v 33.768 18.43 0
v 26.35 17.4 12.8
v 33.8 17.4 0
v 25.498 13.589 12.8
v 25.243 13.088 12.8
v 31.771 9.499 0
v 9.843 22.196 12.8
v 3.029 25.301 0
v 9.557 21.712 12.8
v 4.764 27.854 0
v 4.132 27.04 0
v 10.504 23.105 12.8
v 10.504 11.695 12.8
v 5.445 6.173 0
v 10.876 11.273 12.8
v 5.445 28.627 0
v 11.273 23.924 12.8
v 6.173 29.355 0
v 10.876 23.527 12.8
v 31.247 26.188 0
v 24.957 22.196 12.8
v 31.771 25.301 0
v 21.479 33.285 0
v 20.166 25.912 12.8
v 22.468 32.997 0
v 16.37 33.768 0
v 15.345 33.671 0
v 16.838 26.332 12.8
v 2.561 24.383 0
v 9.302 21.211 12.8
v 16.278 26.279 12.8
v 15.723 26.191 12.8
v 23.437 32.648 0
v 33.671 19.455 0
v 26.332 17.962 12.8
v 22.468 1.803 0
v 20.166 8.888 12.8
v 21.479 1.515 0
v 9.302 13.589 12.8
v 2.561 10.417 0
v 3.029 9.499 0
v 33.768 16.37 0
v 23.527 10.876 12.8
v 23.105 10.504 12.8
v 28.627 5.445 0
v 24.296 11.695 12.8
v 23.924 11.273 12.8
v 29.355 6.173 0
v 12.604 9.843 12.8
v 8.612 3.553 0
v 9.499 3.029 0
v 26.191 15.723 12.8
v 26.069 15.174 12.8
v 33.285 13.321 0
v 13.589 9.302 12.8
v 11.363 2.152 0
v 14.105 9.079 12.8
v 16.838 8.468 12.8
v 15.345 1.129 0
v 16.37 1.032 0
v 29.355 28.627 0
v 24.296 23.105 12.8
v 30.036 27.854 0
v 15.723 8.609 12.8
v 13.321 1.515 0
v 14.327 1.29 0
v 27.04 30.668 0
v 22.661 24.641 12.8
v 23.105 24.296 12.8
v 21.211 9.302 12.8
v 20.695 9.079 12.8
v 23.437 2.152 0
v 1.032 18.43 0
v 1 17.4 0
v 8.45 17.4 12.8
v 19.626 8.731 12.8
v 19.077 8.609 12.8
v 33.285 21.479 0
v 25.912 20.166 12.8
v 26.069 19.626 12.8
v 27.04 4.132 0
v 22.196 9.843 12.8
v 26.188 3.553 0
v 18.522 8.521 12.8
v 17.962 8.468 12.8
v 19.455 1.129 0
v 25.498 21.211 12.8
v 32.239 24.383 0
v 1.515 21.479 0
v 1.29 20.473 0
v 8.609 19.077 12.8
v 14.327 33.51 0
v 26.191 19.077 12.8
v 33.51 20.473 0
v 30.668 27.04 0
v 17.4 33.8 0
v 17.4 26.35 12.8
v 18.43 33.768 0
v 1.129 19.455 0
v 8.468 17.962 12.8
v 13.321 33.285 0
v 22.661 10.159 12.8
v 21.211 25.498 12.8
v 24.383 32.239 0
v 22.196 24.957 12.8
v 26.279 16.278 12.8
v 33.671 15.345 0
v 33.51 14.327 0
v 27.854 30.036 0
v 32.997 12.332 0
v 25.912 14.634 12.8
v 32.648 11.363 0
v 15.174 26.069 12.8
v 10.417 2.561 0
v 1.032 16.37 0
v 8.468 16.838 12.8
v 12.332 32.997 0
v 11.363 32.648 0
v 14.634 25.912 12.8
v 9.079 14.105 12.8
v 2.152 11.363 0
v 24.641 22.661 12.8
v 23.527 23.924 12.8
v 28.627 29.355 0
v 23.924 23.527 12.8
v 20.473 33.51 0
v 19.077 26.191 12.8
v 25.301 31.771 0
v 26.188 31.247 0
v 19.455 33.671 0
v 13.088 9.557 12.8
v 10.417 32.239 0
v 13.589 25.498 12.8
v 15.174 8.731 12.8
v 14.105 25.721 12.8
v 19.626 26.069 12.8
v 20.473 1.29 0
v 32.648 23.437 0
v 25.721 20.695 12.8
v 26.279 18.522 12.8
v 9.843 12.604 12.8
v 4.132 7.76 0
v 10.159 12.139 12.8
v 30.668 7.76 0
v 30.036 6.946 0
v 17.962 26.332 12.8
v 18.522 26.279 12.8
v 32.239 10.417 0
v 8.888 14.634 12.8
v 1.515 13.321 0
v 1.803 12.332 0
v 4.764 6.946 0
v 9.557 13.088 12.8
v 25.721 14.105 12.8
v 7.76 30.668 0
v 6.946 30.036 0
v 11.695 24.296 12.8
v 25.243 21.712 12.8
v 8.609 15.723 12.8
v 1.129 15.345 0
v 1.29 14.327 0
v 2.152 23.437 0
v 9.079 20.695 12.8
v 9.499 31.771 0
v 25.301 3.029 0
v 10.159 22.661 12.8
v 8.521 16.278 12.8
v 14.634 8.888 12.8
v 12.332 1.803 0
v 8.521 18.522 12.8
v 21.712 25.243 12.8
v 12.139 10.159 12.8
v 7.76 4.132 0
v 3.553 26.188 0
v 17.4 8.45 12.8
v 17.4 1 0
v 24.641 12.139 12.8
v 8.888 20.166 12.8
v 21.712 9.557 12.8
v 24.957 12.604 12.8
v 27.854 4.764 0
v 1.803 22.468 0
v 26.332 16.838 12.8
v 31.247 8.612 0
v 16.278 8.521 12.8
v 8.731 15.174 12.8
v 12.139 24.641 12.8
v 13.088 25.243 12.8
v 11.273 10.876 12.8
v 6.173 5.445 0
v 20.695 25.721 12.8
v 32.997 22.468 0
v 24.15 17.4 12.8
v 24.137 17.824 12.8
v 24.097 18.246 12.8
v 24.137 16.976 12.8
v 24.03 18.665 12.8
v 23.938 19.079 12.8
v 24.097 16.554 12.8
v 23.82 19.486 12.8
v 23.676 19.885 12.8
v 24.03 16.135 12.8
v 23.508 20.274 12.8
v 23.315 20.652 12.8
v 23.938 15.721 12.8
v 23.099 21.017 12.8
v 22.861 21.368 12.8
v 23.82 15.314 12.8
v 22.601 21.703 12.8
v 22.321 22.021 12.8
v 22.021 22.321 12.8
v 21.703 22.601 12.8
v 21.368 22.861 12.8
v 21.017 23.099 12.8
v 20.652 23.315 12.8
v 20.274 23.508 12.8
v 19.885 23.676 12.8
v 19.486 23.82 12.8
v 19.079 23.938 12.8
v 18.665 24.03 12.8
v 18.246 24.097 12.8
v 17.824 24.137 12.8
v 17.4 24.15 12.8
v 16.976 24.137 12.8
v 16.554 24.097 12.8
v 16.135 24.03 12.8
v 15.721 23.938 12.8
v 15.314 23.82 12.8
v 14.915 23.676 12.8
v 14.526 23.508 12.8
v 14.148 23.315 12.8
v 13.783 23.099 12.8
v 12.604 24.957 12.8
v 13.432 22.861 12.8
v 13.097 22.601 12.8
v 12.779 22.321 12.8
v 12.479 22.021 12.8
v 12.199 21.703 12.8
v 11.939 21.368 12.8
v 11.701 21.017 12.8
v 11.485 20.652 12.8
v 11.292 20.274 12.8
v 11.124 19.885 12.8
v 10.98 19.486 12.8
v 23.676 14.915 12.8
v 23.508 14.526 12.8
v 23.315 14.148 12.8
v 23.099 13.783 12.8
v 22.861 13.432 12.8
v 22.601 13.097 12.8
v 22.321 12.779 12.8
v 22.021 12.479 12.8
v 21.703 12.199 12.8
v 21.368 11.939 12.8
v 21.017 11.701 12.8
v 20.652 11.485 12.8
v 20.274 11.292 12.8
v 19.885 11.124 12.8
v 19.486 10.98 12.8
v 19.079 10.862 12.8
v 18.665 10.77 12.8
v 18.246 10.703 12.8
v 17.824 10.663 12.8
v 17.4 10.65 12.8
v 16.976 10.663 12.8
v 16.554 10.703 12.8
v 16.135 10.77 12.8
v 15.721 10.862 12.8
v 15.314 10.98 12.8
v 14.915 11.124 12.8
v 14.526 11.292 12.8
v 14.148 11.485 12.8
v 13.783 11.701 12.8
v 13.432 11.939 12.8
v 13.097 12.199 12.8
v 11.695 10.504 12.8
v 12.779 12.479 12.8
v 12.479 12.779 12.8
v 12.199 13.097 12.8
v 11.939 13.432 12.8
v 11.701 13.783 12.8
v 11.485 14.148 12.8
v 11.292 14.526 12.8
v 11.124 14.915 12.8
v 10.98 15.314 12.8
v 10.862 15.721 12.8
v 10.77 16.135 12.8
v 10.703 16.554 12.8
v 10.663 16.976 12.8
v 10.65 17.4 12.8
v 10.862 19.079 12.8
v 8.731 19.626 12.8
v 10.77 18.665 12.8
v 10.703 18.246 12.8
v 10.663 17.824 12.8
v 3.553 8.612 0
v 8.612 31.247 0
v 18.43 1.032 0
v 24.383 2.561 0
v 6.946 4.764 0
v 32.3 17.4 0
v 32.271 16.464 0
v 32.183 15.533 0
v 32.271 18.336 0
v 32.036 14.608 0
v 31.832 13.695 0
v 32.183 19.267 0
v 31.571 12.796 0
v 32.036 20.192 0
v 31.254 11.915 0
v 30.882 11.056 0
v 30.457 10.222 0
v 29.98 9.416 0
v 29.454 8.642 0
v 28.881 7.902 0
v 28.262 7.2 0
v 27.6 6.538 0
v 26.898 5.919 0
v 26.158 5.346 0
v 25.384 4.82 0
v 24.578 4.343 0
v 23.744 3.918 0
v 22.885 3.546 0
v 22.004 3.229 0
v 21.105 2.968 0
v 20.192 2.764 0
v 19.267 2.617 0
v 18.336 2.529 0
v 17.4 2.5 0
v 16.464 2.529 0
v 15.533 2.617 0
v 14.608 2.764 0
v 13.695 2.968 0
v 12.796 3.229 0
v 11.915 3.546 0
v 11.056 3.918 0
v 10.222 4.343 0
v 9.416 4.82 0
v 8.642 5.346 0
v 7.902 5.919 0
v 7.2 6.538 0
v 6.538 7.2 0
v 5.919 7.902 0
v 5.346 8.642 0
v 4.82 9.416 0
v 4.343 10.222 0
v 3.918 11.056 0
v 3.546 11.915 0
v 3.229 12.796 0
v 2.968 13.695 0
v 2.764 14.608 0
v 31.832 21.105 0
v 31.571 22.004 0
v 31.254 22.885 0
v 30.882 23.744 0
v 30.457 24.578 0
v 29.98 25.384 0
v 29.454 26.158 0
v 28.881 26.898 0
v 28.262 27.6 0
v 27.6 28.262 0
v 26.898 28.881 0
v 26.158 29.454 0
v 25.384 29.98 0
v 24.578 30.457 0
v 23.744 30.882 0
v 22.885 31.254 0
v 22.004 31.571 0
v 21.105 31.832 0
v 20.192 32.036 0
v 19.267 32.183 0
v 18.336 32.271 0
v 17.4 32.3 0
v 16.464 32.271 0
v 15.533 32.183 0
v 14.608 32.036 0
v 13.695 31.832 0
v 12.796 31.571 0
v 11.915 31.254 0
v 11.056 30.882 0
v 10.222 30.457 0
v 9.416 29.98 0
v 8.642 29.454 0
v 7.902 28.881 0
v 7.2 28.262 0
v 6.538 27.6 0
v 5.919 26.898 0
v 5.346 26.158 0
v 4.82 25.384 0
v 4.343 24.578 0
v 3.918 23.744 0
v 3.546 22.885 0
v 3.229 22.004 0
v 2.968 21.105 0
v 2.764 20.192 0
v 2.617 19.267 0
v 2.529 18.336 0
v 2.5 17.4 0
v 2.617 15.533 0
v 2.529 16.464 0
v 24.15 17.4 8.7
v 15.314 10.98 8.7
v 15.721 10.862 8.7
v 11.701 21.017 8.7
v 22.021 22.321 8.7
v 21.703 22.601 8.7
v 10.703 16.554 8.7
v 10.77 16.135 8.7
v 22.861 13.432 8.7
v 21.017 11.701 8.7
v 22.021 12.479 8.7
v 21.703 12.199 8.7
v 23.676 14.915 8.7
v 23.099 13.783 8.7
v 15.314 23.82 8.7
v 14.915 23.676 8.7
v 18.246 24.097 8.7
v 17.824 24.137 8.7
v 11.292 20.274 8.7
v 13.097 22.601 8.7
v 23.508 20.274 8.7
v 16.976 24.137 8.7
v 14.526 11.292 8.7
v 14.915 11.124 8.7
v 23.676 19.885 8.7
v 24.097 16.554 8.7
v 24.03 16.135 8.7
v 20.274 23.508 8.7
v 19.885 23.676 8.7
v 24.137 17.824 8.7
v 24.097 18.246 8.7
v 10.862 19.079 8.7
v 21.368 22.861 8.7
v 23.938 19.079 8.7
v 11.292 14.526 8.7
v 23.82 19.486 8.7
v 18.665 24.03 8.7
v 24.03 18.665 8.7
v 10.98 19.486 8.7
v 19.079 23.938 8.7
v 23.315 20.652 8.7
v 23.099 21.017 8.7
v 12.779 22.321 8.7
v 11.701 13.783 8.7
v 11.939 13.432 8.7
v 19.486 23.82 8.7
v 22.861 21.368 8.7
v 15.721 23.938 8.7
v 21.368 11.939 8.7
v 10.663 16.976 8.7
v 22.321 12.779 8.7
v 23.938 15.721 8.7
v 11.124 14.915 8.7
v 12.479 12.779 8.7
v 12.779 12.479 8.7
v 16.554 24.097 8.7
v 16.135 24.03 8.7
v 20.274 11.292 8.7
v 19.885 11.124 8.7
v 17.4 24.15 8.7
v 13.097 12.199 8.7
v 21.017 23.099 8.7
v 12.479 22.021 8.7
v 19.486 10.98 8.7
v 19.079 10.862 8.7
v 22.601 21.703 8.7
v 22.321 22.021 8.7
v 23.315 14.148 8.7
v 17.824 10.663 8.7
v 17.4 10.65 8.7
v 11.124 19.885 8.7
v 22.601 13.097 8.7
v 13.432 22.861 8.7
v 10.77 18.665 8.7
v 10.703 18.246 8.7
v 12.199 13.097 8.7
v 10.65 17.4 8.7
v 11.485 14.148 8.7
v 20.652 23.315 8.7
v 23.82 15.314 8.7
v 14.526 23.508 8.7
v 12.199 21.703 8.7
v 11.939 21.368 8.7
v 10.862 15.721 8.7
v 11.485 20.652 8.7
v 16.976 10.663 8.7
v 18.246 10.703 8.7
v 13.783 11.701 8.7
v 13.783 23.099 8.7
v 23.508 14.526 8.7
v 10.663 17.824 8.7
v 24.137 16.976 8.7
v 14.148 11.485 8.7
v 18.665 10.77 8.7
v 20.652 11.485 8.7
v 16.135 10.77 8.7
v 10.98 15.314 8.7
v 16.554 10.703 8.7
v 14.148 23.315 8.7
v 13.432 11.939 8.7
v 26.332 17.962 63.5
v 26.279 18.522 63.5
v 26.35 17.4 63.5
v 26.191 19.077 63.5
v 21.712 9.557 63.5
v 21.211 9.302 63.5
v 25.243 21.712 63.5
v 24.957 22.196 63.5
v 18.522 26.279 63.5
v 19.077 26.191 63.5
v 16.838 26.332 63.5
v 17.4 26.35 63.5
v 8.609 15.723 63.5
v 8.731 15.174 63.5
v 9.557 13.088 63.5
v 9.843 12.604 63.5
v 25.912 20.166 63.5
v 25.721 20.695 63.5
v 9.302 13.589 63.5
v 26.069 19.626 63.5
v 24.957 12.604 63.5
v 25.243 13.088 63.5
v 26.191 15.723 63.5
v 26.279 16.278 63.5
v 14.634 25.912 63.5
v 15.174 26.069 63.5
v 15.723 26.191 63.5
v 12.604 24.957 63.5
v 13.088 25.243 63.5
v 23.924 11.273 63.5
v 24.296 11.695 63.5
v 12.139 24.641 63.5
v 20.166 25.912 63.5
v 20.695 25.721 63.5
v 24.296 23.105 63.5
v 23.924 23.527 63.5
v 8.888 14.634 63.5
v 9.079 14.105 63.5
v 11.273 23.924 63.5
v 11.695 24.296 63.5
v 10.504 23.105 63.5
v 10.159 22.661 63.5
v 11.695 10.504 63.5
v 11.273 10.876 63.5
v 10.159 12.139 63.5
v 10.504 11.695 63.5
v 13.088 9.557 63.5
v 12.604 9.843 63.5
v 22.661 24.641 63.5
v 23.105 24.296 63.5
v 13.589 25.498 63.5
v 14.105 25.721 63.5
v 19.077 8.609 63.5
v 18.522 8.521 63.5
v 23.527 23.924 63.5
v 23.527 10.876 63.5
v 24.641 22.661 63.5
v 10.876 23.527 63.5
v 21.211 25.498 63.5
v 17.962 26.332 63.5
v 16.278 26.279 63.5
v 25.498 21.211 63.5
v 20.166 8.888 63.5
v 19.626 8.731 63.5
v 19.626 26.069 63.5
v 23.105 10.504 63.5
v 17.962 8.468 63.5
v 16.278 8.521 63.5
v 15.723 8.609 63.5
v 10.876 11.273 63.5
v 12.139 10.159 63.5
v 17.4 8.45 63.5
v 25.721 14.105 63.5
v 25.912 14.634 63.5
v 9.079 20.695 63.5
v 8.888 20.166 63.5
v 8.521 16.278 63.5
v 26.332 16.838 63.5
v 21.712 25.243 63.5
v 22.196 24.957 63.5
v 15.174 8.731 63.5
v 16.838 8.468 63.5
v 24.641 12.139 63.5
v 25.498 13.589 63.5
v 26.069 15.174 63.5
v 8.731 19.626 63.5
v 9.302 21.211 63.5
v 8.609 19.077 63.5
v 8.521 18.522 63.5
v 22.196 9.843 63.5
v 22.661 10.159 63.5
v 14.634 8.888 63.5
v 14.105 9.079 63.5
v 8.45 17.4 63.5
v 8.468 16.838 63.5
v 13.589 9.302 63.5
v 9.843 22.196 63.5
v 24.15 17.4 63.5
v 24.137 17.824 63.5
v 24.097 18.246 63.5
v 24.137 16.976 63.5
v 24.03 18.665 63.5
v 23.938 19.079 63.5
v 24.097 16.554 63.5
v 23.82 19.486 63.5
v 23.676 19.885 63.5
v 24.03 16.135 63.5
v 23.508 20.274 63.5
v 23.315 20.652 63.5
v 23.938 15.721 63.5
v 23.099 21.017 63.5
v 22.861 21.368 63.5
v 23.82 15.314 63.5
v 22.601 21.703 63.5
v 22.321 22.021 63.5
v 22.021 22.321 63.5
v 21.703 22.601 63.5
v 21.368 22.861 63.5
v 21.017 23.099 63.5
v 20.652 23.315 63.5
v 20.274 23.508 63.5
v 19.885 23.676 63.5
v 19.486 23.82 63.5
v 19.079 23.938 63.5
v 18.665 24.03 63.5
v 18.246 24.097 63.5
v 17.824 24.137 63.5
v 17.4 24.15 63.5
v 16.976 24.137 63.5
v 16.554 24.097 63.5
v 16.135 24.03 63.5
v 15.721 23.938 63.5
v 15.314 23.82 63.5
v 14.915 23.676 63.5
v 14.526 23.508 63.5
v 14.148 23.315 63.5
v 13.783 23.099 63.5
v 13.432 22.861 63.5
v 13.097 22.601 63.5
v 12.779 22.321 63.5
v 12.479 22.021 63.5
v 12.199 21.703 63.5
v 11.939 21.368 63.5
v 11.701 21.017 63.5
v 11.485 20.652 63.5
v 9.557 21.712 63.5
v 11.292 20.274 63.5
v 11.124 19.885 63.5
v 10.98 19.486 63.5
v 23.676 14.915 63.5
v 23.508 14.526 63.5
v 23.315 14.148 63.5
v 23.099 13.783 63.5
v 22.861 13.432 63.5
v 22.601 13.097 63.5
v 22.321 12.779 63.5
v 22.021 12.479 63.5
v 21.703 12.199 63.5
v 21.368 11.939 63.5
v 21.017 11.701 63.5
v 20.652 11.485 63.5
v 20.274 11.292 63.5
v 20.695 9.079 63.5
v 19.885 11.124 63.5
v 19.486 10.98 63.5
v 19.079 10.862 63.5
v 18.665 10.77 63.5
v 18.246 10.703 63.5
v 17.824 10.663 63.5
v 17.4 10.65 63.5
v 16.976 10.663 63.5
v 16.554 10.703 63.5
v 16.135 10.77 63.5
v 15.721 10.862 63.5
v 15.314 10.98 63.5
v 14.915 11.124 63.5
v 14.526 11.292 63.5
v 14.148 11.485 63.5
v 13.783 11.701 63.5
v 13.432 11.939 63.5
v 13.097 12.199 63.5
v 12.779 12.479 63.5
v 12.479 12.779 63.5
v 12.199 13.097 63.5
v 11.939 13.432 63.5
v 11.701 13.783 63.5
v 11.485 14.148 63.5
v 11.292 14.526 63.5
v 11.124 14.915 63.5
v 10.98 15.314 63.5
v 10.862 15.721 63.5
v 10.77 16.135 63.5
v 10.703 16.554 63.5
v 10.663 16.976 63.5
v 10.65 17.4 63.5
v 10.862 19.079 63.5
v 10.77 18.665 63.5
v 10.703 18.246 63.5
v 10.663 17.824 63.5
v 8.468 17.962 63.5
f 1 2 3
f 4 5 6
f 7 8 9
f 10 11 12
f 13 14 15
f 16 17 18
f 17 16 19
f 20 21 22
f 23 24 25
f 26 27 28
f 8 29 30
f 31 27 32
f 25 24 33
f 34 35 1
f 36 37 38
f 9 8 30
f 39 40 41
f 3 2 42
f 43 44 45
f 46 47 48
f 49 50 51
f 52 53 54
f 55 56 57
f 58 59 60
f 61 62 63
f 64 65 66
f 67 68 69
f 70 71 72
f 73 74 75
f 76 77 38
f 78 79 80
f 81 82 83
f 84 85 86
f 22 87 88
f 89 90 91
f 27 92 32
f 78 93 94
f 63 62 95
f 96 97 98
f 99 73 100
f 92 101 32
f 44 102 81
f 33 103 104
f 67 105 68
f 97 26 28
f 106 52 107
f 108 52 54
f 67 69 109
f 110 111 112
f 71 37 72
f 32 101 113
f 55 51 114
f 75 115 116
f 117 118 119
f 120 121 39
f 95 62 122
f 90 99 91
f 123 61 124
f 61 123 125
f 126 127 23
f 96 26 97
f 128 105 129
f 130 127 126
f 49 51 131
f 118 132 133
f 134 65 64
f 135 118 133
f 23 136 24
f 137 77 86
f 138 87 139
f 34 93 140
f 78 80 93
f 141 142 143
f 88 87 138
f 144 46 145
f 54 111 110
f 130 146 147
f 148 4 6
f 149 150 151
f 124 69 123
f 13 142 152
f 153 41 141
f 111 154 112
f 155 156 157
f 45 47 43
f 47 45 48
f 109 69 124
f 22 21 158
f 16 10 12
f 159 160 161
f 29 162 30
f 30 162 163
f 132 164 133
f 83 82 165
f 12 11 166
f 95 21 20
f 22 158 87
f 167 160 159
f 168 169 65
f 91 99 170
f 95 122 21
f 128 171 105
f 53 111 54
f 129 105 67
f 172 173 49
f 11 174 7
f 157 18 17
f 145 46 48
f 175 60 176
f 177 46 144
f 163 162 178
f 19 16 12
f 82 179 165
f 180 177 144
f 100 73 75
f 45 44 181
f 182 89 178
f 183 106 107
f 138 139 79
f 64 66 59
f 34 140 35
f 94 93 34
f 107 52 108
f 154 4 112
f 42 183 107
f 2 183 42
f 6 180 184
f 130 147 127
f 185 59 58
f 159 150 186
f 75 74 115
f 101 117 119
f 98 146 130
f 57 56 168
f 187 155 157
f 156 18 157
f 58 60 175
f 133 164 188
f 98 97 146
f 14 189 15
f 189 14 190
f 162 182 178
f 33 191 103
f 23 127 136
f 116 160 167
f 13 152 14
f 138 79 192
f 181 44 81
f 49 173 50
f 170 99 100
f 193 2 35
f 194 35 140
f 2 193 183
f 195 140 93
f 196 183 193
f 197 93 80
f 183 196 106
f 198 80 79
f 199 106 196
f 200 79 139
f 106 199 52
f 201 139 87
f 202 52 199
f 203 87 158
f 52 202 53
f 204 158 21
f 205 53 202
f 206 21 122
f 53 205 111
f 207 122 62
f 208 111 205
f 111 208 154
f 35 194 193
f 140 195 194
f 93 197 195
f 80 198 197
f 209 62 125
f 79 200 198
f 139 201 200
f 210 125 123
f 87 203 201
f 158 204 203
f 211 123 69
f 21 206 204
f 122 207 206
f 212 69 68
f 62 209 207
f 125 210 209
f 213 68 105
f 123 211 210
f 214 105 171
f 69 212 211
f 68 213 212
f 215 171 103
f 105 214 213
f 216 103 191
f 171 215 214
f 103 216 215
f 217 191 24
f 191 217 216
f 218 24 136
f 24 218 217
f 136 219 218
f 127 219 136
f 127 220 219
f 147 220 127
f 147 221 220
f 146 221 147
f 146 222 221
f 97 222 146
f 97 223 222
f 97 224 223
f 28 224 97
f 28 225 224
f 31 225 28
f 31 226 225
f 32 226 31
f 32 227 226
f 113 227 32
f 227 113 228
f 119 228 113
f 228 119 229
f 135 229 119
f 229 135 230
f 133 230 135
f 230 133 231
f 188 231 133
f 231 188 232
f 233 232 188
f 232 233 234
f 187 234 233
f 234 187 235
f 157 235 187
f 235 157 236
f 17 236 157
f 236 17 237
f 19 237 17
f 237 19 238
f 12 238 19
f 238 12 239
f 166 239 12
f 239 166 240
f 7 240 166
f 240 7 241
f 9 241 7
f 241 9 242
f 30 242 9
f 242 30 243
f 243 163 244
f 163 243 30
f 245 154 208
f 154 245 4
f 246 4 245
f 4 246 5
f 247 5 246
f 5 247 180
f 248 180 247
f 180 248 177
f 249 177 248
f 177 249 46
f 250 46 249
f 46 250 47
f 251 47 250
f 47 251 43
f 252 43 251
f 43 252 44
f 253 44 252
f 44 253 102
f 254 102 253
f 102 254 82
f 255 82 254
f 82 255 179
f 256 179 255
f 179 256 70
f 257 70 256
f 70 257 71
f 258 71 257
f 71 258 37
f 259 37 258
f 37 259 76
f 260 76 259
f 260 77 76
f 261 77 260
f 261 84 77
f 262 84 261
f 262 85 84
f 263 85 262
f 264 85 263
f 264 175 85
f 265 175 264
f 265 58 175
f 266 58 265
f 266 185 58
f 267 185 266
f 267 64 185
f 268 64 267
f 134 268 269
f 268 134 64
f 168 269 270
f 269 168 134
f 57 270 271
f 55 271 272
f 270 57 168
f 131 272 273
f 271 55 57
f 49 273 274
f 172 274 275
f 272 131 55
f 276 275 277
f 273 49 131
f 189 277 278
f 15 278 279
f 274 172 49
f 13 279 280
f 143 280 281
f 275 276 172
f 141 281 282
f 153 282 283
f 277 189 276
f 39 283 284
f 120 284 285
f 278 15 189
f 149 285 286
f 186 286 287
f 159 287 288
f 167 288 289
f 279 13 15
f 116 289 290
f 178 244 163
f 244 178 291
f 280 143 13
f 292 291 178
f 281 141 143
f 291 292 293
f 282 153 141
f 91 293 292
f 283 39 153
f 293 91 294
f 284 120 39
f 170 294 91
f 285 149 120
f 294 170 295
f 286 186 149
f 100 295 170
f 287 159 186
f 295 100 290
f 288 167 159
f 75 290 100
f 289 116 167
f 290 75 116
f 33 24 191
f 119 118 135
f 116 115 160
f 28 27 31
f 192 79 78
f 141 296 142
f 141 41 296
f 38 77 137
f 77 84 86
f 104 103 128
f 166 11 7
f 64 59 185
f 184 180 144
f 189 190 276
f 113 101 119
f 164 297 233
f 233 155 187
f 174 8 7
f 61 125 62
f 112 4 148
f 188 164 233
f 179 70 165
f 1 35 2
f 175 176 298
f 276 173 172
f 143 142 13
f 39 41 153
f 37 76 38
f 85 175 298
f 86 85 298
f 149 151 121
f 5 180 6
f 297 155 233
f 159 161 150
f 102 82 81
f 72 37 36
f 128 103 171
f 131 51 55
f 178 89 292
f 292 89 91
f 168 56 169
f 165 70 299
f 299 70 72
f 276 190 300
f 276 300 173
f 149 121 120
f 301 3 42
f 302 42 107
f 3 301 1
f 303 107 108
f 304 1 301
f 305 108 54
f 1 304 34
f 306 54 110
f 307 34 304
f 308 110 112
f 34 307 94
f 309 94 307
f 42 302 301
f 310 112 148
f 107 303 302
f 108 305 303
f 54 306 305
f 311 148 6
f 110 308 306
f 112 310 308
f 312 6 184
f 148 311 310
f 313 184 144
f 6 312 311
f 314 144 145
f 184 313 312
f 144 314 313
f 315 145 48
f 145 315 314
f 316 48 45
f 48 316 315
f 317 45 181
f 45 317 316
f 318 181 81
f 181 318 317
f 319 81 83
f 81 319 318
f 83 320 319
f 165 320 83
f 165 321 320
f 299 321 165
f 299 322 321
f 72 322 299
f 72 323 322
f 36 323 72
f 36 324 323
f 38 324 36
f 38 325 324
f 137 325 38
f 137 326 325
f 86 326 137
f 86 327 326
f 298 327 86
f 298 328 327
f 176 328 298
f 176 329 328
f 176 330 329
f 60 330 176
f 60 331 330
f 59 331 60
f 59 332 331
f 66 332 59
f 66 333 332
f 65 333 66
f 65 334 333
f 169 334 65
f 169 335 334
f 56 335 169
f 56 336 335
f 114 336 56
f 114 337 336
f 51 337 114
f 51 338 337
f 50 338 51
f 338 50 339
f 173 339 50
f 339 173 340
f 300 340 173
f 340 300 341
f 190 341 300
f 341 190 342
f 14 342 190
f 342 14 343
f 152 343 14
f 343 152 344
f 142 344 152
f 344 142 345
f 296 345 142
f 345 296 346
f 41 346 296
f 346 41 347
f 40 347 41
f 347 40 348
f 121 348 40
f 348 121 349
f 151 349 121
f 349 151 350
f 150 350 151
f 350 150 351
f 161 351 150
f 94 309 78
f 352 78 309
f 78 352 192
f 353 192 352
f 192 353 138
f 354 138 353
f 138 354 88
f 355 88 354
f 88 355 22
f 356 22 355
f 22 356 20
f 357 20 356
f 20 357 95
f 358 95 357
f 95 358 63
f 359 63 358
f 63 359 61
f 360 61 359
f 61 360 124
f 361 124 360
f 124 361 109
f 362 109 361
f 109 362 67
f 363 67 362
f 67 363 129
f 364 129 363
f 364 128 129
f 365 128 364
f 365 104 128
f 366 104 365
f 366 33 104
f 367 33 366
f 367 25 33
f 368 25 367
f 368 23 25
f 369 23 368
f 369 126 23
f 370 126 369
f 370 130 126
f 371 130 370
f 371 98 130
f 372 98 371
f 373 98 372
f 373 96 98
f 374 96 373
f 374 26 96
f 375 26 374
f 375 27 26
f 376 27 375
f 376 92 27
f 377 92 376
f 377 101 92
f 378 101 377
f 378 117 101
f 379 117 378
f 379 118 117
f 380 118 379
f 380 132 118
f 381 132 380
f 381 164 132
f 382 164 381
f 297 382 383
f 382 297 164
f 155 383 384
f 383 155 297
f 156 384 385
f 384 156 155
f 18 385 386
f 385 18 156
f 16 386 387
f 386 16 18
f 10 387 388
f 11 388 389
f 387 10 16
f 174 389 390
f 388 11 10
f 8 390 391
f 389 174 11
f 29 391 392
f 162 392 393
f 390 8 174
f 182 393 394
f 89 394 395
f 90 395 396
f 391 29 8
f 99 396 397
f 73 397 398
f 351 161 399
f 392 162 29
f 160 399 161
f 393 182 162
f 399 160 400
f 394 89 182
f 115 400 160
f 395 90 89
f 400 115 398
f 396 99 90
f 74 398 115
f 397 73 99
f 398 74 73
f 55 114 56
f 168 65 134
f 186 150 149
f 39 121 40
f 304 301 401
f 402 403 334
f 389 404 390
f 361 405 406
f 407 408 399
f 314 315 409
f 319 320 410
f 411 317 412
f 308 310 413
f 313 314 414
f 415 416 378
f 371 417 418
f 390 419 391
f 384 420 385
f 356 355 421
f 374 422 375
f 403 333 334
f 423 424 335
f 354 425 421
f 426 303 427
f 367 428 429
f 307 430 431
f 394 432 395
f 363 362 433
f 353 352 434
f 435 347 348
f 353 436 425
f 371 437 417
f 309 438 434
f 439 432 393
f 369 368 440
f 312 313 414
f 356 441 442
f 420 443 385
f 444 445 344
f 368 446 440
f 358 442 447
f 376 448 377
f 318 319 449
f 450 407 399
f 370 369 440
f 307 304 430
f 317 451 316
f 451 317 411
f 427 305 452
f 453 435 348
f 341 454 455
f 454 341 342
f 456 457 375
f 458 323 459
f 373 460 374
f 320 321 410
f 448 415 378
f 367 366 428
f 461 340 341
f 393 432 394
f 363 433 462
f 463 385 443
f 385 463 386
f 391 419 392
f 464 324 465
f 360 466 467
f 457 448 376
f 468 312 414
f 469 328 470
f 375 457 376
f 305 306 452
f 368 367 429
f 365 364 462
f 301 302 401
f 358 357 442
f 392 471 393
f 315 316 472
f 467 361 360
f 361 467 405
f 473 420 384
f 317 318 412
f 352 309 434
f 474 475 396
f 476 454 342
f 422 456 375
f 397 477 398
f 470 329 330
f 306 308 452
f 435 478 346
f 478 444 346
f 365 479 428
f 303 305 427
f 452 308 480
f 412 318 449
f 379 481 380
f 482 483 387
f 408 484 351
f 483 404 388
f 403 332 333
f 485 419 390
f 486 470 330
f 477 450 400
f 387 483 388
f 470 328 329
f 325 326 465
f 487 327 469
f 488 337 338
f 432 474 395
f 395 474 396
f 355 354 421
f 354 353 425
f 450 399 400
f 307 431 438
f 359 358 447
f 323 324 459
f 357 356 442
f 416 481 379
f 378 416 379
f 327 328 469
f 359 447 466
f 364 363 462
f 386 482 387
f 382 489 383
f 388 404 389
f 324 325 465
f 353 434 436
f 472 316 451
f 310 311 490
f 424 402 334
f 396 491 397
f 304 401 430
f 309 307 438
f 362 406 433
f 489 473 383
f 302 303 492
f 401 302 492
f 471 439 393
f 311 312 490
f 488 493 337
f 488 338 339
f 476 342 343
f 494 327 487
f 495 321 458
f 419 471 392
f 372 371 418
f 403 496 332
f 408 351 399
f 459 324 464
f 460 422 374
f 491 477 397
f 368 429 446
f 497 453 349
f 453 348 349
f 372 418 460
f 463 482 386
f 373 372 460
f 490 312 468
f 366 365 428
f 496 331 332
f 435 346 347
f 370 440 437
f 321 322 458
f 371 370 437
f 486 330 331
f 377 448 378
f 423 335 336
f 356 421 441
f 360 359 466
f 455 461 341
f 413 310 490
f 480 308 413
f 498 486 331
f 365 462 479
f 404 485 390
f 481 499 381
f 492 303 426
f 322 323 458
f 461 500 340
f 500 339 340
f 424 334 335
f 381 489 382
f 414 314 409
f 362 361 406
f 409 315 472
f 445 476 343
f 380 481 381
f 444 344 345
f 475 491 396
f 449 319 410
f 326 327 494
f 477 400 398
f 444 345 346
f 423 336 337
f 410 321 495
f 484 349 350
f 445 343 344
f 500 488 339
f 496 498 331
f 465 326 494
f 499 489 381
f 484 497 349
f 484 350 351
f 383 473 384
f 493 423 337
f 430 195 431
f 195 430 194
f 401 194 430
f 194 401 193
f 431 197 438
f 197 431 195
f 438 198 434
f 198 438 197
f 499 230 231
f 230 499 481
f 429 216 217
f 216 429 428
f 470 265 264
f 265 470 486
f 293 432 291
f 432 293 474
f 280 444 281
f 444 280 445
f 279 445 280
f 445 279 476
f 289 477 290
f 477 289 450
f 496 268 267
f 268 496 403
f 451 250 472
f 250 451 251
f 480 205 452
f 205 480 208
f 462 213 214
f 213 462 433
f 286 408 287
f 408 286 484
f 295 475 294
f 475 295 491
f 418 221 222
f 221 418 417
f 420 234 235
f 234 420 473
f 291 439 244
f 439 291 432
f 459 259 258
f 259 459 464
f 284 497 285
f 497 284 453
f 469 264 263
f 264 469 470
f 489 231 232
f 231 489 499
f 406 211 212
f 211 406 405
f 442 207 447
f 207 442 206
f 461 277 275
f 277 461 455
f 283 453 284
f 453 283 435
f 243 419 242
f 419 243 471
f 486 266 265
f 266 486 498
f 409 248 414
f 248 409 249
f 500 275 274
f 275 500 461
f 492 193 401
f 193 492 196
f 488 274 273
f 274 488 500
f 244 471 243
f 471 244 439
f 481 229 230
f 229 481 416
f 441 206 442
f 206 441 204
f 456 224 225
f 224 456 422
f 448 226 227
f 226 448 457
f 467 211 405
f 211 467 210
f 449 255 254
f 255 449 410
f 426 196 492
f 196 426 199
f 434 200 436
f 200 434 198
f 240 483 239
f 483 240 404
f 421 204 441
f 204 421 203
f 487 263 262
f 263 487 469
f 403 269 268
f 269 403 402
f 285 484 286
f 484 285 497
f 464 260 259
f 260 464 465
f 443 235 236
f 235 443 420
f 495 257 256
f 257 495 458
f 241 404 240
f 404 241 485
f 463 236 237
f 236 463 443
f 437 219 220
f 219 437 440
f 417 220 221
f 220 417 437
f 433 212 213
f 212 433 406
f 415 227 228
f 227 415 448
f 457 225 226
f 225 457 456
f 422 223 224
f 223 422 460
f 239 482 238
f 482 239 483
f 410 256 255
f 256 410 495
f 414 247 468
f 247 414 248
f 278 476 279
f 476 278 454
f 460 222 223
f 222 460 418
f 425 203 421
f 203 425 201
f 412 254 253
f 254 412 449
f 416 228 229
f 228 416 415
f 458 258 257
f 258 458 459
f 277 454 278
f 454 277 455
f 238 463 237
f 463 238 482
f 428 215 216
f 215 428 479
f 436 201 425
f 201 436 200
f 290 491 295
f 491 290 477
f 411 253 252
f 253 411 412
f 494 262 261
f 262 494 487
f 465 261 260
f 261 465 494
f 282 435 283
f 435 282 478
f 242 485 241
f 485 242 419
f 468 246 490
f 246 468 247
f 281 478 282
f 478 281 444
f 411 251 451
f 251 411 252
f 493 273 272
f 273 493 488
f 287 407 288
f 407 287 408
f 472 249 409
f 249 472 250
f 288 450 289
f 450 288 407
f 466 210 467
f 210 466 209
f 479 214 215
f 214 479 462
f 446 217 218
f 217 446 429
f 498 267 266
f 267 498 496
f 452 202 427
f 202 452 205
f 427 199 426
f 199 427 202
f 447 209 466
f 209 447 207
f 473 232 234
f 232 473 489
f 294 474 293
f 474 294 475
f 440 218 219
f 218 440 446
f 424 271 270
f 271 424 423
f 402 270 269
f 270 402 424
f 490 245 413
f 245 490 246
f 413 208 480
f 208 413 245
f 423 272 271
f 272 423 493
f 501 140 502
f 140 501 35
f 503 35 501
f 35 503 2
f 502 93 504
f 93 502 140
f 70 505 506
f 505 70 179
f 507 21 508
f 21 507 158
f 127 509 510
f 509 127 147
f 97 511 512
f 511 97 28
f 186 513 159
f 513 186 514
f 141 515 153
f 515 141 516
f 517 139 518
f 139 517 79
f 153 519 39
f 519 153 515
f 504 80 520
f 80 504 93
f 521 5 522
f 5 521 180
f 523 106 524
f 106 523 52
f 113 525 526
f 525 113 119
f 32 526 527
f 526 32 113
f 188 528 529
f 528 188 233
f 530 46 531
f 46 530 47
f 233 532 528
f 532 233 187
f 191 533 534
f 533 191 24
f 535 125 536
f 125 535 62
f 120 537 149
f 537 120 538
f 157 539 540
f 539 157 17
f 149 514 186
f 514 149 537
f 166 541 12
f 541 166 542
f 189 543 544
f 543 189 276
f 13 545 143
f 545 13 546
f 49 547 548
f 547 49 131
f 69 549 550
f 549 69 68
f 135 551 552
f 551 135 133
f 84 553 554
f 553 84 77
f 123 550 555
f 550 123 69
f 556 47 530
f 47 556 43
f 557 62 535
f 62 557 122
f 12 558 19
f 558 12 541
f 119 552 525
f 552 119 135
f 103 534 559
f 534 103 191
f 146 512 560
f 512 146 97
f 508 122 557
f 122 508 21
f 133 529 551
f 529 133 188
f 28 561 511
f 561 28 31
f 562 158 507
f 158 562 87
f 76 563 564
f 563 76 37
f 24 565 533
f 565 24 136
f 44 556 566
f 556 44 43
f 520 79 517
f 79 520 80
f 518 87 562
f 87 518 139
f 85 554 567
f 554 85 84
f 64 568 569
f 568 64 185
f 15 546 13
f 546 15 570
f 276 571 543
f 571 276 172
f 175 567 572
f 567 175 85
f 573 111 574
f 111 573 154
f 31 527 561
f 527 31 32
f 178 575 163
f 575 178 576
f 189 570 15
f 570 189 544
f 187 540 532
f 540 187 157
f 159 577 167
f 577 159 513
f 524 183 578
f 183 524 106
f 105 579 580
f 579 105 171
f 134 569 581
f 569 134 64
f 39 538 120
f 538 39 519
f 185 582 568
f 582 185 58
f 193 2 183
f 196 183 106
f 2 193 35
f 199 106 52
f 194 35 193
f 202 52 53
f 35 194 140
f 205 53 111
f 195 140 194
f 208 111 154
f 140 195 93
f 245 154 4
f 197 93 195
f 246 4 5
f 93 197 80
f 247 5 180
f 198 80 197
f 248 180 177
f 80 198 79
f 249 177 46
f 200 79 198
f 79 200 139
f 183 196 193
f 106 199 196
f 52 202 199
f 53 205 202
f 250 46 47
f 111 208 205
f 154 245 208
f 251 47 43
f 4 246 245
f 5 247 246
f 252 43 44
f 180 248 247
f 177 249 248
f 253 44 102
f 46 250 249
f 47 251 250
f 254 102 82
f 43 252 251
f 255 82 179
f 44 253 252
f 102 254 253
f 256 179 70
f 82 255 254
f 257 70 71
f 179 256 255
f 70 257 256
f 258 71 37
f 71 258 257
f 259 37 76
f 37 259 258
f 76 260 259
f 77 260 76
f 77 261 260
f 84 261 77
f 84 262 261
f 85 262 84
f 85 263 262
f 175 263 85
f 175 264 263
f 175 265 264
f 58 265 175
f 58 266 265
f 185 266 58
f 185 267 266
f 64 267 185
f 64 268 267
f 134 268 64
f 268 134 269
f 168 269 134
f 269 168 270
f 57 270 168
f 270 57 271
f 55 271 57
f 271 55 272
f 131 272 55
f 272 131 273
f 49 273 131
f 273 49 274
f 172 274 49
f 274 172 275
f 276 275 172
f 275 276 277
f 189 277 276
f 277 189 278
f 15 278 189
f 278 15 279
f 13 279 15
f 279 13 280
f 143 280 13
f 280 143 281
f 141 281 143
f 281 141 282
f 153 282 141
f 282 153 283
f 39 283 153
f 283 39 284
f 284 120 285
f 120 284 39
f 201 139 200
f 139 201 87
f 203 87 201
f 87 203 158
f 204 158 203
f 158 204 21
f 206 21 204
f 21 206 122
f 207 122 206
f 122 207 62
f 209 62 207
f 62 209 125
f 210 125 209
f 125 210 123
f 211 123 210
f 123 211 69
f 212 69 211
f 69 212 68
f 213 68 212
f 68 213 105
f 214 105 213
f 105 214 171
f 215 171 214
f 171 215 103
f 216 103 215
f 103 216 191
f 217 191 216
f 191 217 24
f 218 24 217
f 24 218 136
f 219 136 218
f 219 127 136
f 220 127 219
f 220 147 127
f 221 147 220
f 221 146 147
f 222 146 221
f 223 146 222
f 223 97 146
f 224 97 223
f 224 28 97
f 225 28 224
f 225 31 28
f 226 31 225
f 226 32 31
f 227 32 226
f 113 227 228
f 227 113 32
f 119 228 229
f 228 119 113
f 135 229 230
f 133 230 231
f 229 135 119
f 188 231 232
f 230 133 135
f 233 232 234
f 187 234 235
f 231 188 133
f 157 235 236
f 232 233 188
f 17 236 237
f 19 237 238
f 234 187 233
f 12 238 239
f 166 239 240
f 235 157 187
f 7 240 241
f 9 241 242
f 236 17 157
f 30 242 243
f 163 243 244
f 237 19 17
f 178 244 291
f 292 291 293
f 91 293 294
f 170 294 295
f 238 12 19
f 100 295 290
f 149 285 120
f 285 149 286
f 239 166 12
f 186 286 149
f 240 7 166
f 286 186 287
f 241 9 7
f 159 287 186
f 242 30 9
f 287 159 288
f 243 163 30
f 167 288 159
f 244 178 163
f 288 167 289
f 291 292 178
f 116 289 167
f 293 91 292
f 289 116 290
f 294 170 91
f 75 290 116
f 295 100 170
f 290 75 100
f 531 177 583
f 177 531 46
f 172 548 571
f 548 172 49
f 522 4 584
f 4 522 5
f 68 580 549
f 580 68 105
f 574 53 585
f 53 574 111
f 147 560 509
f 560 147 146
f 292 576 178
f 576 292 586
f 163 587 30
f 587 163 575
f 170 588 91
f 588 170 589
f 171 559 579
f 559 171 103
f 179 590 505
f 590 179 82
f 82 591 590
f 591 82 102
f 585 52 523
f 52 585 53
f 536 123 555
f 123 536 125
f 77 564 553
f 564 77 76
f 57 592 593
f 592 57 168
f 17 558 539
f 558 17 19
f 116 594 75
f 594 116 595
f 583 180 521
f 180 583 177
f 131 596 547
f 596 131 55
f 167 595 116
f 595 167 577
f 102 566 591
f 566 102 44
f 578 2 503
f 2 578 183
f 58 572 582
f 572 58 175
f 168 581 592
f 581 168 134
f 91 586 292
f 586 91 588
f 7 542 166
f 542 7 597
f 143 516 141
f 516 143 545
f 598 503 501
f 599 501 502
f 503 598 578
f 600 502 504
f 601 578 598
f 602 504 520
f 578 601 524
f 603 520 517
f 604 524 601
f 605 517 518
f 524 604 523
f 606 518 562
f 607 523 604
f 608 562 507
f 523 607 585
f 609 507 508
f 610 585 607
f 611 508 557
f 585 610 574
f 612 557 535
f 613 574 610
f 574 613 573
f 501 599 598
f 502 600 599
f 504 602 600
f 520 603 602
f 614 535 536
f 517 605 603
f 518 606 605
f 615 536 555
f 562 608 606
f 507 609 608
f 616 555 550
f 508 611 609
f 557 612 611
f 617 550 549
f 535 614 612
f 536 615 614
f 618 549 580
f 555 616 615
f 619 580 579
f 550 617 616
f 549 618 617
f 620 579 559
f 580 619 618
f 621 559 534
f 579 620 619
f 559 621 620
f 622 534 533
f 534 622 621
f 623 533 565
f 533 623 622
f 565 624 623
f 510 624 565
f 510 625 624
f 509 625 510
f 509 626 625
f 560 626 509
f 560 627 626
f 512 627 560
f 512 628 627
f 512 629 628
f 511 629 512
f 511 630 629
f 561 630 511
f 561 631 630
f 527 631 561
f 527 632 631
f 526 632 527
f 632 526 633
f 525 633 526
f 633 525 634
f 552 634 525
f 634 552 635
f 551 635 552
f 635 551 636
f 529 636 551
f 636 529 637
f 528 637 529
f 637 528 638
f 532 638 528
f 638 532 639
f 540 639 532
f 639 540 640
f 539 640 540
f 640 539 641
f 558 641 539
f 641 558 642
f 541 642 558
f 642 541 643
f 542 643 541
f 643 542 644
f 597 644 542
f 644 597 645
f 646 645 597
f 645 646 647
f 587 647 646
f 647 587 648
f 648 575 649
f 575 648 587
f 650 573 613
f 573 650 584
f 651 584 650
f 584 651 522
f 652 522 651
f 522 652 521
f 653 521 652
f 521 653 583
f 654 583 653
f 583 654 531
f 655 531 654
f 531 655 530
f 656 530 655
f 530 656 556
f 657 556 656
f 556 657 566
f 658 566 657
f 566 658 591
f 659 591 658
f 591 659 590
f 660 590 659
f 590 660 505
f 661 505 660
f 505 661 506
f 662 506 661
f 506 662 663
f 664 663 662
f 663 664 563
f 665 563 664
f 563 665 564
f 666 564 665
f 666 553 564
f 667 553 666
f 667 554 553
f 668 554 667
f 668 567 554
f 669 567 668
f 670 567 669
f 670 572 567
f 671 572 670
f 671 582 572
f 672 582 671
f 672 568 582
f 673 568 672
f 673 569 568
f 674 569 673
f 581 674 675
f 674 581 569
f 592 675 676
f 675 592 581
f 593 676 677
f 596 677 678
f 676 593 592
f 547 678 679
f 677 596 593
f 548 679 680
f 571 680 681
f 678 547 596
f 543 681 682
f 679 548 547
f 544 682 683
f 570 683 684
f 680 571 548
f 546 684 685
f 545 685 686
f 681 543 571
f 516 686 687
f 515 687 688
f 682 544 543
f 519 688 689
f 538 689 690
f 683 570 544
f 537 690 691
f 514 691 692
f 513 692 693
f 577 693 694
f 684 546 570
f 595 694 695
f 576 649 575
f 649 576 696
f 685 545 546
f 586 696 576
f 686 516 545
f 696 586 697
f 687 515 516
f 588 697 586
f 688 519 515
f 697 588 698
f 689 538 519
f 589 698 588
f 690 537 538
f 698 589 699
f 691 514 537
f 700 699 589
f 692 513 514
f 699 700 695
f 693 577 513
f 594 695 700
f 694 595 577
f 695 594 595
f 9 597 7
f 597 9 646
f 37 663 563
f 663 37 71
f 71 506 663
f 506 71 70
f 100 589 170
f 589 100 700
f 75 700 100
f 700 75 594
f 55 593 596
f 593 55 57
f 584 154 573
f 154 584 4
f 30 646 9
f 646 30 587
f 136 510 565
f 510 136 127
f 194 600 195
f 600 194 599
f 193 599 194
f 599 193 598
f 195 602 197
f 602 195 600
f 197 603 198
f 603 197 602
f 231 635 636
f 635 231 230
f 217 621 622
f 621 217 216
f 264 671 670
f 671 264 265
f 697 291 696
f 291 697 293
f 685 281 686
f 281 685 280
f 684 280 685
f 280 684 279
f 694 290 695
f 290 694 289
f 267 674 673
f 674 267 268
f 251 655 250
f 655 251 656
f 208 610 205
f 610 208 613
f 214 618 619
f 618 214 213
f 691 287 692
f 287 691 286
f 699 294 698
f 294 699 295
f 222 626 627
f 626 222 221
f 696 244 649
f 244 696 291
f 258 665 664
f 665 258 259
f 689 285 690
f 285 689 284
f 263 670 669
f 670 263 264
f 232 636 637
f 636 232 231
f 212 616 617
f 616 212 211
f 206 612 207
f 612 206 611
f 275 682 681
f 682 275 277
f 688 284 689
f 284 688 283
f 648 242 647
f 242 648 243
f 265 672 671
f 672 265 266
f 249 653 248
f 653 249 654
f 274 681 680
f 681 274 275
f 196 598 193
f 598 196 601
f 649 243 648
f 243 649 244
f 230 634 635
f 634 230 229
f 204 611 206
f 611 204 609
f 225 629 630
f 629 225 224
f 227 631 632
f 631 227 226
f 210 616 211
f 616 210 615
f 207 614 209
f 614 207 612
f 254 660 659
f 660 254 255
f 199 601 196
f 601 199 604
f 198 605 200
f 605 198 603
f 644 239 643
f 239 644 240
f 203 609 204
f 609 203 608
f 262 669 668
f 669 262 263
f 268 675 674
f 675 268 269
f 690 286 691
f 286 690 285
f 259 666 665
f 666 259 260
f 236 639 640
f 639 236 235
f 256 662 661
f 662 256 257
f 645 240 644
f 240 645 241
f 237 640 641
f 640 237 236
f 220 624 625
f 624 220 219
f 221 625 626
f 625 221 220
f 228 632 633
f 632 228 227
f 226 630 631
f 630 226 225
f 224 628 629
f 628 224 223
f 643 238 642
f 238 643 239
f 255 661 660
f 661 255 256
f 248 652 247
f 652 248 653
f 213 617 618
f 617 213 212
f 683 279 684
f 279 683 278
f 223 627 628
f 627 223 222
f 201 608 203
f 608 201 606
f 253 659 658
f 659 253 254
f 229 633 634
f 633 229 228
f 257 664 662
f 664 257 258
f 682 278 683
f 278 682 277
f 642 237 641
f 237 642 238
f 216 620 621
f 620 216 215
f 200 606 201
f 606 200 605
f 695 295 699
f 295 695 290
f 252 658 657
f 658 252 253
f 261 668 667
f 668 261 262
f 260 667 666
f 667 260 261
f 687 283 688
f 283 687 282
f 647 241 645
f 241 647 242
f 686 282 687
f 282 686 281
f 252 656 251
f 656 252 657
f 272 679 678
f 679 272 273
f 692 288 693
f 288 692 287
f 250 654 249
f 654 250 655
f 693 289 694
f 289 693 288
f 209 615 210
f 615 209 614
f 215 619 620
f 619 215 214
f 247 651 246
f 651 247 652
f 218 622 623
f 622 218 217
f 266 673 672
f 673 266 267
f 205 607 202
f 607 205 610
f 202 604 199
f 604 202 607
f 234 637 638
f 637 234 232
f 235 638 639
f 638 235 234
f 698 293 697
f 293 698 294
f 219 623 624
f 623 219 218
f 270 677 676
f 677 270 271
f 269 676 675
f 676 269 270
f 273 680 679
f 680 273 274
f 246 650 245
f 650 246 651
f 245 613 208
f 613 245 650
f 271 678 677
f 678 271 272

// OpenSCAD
// v1.2 changed inside radius of funnel to 14.9 for a broader print base
// v1.3 added thread to ring 1, removed top notch from wire groove

module outer_ring_tap_29mmDiamRightHanded() {
	import("C:\\Users\\Intel\\Documents\\OpenSCAD\\FunnelTip\\OuterRingTap_29mmDiamRightHanded.stl");	
}

module funnel_tip() {
	union() {

		// Part 1, funnel

		// diameter 32.8 (radius , place (x.y) such that there is 1mm margin
		translate([17.4, 17.4, 0])
		union() {
			difference() { 	
				cylinder(h = 12.8, r1 = 16.4, r2 = 8.95, $fn = 100);		
				cylinder(h = 8.7, r1 = 14.9, r2 = 6.75, $fn = 100); // r1 = 15.4
				translate([0, 0, 8.7])
				cylinder(h = 7.5, r = 6.75, $fn = 100);
			}
			translate([0, 0, 12.8])
			difference() { 
				cylinder(h = 50.7, r = 8.95, $fn = 100);		
				cylinder(h = 50.7, r = 6.75, $fn = 100);
			}
		}


		// Part 2, funnel tip


		/* Notes on placing grooves 
		Base shape (cube + cylinder) is dislocated based on largest radius minus width of cube.
		*/

		// max radius 41.8, place (x.y) such that there is 1mm margin
		// between all elements
/*
		difference() {
			translate([55.7, 21.9, 0])
			union() {
			//base
				difference() {
					cylinder(h = 11.6, r1 = 16.3, r2 = 20.9, $fn = 100); // r1 = 32.6, r2 = 41.8
					cylinder(h = 11.6, r1 = 15.3, r2 = 9, $fn = 100); // r1 = 30.6, r2 = 18
				}
				translate([0, 0, 11.6])
				difference() {
					cylinder(h = 15, r = 20.9, $fn = 100);
					cylinder(h = 15, r = 9, $fn = 100);
				}
				translate([0, 0, 26.6])
				difference() {
					cylinder(h = 10, r = 12.875, $fn = 100);
					cylinder(h = 10, r = 9, $fn = 100);
				}
			}

			translate([55.7, 21.9, 19.6])
			difference() {
				cylinder(h=3.5, r = 20.9, $fn = 100);
				cylinder(h=3.5, r1 = 18.5, r2 = 20.9, $fn = 100);
			}

			// 1st groove, S
			translate([55.7, 2.15,0])
			union() {
				translate([0, 0, 20.8])	  
				rotate ([90,0,0]) cylinder 
				(h = 2.3, r=2.25, center = true, $fn = 100);
				translate([0, 0, 10.4])	  
				cube([4.5, 2.3, 20.8], center = true, $fn = 100);
			}

			// 2nd groove, N
			// translate([55.7, 2.15,0]) // 2.15 + 39.5 = 41.65
			translate([55.7, 41.65,0]) 
			union() {
				translate([0, 0, 20.8])	  
				rotate ([90,0,0]) cylinder 
				(h = 2.3, r=2.25, center = true, $fn = 100);
				translate([0, 0, 10.4])	  
				cube([4.5, 2.3, 20.8], center = true, $fn = 100);
			}

			// 3rd groove, SW
			translate([38.596, 12.025,0]) 
			union() {
				translate([0, 0, 20.8])	  
				rotate ([90,0,120]) cylinder (h = 2.3, r=2.25, center = true, $fn = 100);

				translate([0, 0, 10.4])	
				rotate ([0,0,120])   
				cube([4.5, 2.3, 20.8], center = true, $fn = 100);
			}

			// wire groove, between S and SW groove
			translate([45.825, 4.796,0]) 
			union() {
				//translate([0, 0, 20.8])	  
				//rotate ([90,0,150]) cylinder (h = 2.3, r=2.25, center = true, $fn = 100);

				translate([0, 0, 9.801]) // added one thousand of a mm to eliminate "surface skin"
				rotate ([0,0,150])   
				//cube([4.5, 2.3, 20.8], center = true, $fn = 100);
				cube([4.5, 2.3, 19.602], center = true, $fn = 100);
			}

			// 4th groove, NE
			translate([72.804, 31.775,0]) 
			union() {
				translate([0, 0, 20.8])	  
				rotate ([90,0,120]) cylinder (h = 2.3, r=2.25, center = true, $fn = 100);

				translate([0, 0, 10.4])	
				rotate ([0,0,120])   
				cube([4.5, 2.3, 20.8], center = true, $fn = 100);
			}

			// 5th groove, SE
			translate([72.804, 12.025,0]) 
			union() {
				translate([0, 0, 20.8])	  
				rotate ([90,0,60]) cylinder (h = 2.3, r=2.25, center = true, $fn = 100);

				translate([0, 0, 10.4])	
				rotate ([0,0,60])   
				cube([4.5, 2.3, 20.8], center = true, $fn = 100);
			}

			// 6th groove, SE
			translate([38.596, 31.775,0]) 
			union() {
				translate([0, 0, 20.8])	  
				rotate ([90,0,60]) cylinder (h = 2.3, r=2.25, center = true, $fn = 100);

				translate([0, 0, 10.4])	
				rotate ([0,0,60])   
				cube([4.5, 2.3, 20.8], center = true, $fn = 100);
			}
		}
*/
/*
		// Part 3, threaded ring 1

		translate([21.9, 55.7, 0])
		difference() {
			cylinder(h = 25.5, r = 20.9, $fn = 100);
			cylinder(h = 25.5, r = 12.875, $fn = 100);
			outer_ring_tap_29mmDiamRightHanded();
		}
*/
		// Part 4, ring 2
/*
		translate([55.95, 55.95, 0])
		difference() {
			cylinder(h = 5, r = 12.15, $fn = 100);
			cylinder(h = 5, r = 8.3, $fn = 100);
		}
*/

	}
}

funnel_tip();
